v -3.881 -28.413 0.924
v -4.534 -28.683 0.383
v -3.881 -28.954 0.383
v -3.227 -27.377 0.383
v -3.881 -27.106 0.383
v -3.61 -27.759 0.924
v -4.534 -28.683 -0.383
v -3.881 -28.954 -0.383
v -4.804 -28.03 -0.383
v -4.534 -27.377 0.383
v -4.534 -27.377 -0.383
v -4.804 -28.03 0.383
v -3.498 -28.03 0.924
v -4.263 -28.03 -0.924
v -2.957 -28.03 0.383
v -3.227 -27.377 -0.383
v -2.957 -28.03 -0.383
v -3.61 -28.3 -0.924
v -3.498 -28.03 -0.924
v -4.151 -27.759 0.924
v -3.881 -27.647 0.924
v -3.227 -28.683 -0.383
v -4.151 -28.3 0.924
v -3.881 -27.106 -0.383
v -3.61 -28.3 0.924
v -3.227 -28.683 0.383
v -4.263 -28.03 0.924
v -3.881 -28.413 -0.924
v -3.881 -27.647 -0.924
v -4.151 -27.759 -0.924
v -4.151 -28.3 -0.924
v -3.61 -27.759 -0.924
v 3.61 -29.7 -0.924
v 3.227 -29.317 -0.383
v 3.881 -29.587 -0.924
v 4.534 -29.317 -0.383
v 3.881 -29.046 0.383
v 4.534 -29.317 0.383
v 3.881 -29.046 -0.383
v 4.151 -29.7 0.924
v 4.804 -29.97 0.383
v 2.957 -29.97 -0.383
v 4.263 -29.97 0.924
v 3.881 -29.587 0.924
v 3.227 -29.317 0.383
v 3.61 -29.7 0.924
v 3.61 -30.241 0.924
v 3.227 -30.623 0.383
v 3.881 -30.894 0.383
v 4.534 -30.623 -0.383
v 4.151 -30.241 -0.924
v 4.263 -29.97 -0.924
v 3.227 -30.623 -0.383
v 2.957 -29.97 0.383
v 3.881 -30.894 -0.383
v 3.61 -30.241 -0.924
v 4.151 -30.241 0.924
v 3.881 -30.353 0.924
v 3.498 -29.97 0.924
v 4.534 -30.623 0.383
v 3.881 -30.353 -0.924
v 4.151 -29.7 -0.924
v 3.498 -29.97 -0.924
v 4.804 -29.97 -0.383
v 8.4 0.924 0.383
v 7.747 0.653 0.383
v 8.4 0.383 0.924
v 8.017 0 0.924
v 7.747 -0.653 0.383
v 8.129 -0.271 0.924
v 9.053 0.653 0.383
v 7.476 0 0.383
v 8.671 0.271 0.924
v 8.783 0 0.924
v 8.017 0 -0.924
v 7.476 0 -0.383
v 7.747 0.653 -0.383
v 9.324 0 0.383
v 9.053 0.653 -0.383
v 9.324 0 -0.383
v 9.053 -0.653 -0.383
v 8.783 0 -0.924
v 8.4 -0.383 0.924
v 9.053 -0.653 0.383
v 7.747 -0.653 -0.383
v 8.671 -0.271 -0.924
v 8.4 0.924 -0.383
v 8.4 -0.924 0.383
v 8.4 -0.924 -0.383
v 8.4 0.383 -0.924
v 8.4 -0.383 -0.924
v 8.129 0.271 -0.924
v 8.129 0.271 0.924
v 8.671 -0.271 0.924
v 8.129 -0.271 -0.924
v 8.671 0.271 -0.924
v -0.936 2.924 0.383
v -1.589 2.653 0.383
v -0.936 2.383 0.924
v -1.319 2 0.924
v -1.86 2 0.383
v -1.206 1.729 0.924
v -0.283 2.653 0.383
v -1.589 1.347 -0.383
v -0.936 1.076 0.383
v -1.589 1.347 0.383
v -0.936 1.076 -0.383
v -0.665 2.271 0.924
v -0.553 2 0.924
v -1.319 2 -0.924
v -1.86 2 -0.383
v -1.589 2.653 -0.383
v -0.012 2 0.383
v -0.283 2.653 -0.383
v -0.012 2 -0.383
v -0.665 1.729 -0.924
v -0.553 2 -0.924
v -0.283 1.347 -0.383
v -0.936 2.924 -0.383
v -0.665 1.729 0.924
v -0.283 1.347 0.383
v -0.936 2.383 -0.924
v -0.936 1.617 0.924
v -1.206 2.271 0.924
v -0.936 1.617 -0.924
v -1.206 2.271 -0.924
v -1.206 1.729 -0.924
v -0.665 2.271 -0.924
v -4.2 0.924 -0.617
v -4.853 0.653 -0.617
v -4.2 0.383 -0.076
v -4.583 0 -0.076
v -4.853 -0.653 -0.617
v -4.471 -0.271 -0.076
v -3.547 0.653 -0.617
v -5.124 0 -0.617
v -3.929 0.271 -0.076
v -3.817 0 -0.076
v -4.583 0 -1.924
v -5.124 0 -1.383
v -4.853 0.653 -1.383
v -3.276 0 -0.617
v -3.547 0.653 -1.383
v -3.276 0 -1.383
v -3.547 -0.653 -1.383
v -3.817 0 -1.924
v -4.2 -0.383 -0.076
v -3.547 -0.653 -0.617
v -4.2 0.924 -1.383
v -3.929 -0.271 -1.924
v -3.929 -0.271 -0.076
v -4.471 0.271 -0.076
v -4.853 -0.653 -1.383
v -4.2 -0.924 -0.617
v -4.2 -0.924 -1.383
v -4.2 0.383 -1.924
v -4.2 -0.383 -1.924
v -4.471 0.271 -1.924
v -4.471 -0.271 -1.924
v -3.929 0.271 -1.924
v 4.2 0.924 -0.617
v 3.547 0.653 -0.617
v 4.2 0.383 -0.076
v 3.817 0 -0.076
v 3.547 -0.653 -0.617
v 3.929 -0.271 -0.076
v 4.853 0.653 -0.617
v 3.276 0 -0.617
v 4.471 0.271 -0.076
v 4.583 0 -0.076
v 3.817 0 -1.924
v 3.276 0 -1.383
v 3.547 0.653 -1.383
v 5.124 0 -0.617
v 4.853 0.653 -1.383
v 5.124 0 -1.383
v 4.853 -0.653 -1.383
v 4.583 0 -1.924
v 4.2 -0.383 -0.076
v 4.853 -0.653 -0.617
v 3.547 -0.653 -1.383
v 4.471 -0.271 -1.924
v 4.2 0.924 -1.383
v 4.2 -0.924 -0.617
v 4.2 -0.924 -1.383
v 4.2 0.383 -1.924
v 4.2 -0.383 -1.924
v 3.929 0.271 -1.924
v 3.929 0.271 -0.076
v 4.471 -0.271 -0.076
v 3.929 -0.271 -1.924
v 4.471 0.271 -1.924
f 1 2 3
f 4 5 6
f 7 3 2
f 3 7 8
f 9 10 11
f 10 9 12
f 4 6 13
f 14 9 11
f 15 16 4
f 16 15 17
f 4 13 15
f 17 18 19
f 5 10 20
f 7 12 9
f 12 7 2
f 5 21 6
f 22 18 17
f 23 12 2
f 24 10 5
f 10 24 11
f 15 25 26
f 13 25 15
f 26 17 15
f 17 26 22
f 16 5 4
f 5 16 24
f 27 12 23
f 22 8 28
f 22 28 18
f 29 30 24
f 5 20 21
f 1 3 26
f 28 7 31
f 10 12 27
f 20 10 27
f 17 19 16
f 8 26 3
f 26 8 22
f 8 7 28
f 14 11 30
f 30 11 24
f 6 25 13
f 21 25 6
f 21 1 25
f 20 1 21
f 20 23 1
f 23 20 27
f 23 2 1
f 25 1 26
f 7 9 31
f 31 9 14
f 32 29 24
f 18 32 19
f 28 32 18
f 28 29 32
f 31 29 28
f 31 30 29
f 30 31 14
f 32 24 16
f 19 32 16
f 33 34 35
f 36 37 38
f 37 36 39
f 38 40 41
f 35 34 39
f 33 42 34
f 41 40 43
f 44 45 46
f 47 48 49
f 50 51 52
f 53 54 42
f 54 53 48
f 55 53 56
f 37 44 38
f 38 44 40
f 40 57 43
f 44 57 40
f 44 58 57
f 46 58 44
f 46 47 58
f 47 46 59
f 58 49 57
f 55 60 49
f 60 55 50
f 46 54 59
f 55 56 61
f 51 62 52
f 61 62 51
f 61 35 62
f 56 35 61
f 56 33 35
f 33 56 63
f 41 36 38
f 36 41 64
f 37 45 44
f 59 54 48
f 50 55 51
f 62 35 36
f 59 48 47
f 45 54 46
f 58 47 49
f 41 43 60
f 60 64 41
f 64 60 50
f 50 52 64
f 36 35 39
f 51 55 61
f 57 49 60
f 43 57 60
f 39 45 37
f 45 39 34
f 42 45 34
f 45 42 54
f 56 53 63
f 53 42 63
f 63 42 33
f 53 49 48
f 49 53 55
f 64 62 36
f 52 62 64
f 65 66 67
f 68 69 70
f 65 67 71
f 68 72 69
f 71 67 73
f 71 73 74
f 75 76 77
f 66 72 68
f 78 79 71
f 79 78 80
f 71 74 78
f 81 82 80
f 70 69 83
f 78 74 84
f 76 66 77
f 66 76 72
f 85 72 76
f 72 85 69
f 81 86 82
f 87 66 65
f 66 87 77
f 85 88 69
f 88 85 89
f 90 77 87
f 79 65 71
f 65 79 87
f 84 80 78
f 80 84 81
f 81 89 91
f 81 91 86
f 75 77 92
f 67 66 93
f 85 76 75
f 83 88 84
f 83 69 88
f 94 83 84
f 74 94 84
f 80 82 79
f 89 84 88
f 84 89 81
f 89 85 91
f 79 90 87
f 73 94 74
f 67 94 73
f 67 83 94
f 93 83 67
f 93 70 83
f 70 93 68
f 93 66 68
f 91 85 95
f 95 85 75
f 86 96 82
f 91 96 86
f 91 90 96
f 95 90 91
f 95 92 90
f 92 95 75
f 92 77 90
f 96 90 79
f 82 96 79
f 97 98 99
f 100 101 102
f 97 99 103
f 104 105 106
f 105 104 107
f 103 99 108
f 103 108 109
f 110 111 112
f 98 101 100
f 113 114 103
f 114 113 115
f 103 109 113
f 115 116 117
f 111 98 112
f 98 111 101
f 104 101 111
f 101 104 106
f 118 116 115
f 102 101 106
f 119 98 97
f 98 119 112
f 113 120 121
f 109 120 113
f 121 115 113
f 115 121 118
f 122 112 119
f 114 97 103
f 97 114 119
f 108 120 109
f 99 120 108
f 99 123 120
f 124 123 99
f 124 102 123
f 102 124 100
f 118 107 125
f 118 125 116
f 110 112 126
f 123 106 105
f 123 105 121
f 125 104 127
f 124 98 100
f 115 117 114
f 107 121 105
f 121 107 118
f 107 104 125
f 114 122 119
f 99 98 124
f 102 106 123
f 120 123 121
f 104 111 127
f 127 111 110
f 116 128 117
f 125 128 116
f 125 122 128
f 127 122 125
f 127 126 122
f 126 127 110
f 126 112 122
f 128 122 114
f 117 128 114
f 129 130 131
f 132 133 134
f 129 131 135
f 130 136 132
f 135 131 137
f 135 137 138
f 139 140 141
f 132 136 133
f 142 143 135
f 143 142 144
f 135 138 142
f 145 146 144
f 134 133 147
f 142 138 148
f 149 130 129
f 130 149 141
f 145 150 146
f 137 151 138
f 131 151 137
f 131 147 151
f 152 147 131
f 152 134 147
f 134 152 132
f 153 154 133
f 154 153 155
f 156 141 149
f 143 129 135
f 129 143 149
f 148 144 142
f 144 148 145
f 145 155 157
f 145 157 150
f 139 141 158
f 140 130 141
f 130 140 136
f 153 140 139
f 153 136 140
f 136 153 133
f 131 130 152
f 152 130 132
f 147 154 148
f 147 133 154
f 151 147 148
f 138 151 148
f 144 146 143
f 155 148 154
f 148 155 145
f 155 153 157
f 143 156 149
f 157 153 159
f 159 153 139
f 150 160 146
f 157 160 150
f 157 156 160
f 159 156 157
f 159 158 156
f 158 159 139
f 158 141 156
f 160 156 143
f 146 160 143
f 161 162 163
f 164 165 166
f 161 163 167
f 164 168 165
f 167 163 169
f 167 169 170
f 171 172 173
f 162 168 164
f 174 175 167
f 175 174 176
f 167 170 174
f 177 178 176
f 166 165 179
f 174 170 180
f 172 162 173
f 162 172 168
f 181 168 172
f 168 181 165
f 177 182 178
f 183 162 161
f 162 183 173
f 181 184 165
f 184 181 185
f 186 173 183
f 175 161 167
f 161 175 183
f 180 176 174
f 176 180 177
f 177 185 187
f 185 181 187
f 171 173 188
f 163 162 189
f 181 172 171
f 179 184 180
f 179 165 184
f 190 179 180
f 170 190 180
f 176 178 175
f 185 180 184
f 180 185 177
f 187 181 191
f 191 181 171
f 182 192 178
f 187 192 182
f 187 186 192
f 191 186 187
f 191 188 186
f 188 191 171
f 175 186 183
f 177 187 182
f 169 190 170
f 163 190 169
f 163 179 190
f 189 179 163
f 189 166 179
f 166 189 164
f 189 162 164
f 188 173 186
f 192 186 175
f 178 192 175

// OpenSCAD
 $fn=8;
time=$t*10;
    ahead=30;
    r=4;
    a0=[r*1.05,0,-1];
    b0=[-r*1.05,0,-1];
    a=[r*1.1+cos(time*360   )*r,sin(time*360)   *r,0];
    b=[-r*1.1+cos(time*360+ahead)*r,sin(time*360+ahead)*r,0];
    c=[r,a.y-30,0];
    d=[-r,b.y-30,0];
    e=lerp(c,d,.5) +un(d-c)*r;
    f=lerp(c,d,.5) -un(d-c)*r;
    
    
  color("red")    translate(e){sphere(1);}
   color("red")   translate(f){sphere(1);}
    
  color("red")     translate(a){sphere(1);}
  color("red")    translate(b){sphere(1);}
    color("red")   translate(b0) sphere(1);
  
  color("lightgray")    translate(b0) circle(r,$fn=18);
      color("red")   translate(a0) sphere(1);
  
  color("lightgray")    translate(  a0) circle(r,$fn=18);
union(){
    $fn=8;
    
  color("yellow")    hull() {
    translate(lerp(f,e,-1.))circle(.5);
   translate(lerp(f,e,1.5)) circle(.5);

    }
   color("blue")   hull() {
    translate(b){circle(.5);}
   translate(e) circle(.5);

    }
     color("blue") hull() {
    translate(a){circle(.5);}
    translate(f)circle(.5);

    }
    
      color("lightgray")  hull() {
    translate(lerp(f,e,1.5))circle(.25);
   translate([-50,-30,0]) circle(.25);

    }
    
    
}
    function lerp(start, end, bias) = (end * bias + start * (1 - bias));
function un(v) = assert(is_list(v)) v / max(norm(v), 1e-64);
